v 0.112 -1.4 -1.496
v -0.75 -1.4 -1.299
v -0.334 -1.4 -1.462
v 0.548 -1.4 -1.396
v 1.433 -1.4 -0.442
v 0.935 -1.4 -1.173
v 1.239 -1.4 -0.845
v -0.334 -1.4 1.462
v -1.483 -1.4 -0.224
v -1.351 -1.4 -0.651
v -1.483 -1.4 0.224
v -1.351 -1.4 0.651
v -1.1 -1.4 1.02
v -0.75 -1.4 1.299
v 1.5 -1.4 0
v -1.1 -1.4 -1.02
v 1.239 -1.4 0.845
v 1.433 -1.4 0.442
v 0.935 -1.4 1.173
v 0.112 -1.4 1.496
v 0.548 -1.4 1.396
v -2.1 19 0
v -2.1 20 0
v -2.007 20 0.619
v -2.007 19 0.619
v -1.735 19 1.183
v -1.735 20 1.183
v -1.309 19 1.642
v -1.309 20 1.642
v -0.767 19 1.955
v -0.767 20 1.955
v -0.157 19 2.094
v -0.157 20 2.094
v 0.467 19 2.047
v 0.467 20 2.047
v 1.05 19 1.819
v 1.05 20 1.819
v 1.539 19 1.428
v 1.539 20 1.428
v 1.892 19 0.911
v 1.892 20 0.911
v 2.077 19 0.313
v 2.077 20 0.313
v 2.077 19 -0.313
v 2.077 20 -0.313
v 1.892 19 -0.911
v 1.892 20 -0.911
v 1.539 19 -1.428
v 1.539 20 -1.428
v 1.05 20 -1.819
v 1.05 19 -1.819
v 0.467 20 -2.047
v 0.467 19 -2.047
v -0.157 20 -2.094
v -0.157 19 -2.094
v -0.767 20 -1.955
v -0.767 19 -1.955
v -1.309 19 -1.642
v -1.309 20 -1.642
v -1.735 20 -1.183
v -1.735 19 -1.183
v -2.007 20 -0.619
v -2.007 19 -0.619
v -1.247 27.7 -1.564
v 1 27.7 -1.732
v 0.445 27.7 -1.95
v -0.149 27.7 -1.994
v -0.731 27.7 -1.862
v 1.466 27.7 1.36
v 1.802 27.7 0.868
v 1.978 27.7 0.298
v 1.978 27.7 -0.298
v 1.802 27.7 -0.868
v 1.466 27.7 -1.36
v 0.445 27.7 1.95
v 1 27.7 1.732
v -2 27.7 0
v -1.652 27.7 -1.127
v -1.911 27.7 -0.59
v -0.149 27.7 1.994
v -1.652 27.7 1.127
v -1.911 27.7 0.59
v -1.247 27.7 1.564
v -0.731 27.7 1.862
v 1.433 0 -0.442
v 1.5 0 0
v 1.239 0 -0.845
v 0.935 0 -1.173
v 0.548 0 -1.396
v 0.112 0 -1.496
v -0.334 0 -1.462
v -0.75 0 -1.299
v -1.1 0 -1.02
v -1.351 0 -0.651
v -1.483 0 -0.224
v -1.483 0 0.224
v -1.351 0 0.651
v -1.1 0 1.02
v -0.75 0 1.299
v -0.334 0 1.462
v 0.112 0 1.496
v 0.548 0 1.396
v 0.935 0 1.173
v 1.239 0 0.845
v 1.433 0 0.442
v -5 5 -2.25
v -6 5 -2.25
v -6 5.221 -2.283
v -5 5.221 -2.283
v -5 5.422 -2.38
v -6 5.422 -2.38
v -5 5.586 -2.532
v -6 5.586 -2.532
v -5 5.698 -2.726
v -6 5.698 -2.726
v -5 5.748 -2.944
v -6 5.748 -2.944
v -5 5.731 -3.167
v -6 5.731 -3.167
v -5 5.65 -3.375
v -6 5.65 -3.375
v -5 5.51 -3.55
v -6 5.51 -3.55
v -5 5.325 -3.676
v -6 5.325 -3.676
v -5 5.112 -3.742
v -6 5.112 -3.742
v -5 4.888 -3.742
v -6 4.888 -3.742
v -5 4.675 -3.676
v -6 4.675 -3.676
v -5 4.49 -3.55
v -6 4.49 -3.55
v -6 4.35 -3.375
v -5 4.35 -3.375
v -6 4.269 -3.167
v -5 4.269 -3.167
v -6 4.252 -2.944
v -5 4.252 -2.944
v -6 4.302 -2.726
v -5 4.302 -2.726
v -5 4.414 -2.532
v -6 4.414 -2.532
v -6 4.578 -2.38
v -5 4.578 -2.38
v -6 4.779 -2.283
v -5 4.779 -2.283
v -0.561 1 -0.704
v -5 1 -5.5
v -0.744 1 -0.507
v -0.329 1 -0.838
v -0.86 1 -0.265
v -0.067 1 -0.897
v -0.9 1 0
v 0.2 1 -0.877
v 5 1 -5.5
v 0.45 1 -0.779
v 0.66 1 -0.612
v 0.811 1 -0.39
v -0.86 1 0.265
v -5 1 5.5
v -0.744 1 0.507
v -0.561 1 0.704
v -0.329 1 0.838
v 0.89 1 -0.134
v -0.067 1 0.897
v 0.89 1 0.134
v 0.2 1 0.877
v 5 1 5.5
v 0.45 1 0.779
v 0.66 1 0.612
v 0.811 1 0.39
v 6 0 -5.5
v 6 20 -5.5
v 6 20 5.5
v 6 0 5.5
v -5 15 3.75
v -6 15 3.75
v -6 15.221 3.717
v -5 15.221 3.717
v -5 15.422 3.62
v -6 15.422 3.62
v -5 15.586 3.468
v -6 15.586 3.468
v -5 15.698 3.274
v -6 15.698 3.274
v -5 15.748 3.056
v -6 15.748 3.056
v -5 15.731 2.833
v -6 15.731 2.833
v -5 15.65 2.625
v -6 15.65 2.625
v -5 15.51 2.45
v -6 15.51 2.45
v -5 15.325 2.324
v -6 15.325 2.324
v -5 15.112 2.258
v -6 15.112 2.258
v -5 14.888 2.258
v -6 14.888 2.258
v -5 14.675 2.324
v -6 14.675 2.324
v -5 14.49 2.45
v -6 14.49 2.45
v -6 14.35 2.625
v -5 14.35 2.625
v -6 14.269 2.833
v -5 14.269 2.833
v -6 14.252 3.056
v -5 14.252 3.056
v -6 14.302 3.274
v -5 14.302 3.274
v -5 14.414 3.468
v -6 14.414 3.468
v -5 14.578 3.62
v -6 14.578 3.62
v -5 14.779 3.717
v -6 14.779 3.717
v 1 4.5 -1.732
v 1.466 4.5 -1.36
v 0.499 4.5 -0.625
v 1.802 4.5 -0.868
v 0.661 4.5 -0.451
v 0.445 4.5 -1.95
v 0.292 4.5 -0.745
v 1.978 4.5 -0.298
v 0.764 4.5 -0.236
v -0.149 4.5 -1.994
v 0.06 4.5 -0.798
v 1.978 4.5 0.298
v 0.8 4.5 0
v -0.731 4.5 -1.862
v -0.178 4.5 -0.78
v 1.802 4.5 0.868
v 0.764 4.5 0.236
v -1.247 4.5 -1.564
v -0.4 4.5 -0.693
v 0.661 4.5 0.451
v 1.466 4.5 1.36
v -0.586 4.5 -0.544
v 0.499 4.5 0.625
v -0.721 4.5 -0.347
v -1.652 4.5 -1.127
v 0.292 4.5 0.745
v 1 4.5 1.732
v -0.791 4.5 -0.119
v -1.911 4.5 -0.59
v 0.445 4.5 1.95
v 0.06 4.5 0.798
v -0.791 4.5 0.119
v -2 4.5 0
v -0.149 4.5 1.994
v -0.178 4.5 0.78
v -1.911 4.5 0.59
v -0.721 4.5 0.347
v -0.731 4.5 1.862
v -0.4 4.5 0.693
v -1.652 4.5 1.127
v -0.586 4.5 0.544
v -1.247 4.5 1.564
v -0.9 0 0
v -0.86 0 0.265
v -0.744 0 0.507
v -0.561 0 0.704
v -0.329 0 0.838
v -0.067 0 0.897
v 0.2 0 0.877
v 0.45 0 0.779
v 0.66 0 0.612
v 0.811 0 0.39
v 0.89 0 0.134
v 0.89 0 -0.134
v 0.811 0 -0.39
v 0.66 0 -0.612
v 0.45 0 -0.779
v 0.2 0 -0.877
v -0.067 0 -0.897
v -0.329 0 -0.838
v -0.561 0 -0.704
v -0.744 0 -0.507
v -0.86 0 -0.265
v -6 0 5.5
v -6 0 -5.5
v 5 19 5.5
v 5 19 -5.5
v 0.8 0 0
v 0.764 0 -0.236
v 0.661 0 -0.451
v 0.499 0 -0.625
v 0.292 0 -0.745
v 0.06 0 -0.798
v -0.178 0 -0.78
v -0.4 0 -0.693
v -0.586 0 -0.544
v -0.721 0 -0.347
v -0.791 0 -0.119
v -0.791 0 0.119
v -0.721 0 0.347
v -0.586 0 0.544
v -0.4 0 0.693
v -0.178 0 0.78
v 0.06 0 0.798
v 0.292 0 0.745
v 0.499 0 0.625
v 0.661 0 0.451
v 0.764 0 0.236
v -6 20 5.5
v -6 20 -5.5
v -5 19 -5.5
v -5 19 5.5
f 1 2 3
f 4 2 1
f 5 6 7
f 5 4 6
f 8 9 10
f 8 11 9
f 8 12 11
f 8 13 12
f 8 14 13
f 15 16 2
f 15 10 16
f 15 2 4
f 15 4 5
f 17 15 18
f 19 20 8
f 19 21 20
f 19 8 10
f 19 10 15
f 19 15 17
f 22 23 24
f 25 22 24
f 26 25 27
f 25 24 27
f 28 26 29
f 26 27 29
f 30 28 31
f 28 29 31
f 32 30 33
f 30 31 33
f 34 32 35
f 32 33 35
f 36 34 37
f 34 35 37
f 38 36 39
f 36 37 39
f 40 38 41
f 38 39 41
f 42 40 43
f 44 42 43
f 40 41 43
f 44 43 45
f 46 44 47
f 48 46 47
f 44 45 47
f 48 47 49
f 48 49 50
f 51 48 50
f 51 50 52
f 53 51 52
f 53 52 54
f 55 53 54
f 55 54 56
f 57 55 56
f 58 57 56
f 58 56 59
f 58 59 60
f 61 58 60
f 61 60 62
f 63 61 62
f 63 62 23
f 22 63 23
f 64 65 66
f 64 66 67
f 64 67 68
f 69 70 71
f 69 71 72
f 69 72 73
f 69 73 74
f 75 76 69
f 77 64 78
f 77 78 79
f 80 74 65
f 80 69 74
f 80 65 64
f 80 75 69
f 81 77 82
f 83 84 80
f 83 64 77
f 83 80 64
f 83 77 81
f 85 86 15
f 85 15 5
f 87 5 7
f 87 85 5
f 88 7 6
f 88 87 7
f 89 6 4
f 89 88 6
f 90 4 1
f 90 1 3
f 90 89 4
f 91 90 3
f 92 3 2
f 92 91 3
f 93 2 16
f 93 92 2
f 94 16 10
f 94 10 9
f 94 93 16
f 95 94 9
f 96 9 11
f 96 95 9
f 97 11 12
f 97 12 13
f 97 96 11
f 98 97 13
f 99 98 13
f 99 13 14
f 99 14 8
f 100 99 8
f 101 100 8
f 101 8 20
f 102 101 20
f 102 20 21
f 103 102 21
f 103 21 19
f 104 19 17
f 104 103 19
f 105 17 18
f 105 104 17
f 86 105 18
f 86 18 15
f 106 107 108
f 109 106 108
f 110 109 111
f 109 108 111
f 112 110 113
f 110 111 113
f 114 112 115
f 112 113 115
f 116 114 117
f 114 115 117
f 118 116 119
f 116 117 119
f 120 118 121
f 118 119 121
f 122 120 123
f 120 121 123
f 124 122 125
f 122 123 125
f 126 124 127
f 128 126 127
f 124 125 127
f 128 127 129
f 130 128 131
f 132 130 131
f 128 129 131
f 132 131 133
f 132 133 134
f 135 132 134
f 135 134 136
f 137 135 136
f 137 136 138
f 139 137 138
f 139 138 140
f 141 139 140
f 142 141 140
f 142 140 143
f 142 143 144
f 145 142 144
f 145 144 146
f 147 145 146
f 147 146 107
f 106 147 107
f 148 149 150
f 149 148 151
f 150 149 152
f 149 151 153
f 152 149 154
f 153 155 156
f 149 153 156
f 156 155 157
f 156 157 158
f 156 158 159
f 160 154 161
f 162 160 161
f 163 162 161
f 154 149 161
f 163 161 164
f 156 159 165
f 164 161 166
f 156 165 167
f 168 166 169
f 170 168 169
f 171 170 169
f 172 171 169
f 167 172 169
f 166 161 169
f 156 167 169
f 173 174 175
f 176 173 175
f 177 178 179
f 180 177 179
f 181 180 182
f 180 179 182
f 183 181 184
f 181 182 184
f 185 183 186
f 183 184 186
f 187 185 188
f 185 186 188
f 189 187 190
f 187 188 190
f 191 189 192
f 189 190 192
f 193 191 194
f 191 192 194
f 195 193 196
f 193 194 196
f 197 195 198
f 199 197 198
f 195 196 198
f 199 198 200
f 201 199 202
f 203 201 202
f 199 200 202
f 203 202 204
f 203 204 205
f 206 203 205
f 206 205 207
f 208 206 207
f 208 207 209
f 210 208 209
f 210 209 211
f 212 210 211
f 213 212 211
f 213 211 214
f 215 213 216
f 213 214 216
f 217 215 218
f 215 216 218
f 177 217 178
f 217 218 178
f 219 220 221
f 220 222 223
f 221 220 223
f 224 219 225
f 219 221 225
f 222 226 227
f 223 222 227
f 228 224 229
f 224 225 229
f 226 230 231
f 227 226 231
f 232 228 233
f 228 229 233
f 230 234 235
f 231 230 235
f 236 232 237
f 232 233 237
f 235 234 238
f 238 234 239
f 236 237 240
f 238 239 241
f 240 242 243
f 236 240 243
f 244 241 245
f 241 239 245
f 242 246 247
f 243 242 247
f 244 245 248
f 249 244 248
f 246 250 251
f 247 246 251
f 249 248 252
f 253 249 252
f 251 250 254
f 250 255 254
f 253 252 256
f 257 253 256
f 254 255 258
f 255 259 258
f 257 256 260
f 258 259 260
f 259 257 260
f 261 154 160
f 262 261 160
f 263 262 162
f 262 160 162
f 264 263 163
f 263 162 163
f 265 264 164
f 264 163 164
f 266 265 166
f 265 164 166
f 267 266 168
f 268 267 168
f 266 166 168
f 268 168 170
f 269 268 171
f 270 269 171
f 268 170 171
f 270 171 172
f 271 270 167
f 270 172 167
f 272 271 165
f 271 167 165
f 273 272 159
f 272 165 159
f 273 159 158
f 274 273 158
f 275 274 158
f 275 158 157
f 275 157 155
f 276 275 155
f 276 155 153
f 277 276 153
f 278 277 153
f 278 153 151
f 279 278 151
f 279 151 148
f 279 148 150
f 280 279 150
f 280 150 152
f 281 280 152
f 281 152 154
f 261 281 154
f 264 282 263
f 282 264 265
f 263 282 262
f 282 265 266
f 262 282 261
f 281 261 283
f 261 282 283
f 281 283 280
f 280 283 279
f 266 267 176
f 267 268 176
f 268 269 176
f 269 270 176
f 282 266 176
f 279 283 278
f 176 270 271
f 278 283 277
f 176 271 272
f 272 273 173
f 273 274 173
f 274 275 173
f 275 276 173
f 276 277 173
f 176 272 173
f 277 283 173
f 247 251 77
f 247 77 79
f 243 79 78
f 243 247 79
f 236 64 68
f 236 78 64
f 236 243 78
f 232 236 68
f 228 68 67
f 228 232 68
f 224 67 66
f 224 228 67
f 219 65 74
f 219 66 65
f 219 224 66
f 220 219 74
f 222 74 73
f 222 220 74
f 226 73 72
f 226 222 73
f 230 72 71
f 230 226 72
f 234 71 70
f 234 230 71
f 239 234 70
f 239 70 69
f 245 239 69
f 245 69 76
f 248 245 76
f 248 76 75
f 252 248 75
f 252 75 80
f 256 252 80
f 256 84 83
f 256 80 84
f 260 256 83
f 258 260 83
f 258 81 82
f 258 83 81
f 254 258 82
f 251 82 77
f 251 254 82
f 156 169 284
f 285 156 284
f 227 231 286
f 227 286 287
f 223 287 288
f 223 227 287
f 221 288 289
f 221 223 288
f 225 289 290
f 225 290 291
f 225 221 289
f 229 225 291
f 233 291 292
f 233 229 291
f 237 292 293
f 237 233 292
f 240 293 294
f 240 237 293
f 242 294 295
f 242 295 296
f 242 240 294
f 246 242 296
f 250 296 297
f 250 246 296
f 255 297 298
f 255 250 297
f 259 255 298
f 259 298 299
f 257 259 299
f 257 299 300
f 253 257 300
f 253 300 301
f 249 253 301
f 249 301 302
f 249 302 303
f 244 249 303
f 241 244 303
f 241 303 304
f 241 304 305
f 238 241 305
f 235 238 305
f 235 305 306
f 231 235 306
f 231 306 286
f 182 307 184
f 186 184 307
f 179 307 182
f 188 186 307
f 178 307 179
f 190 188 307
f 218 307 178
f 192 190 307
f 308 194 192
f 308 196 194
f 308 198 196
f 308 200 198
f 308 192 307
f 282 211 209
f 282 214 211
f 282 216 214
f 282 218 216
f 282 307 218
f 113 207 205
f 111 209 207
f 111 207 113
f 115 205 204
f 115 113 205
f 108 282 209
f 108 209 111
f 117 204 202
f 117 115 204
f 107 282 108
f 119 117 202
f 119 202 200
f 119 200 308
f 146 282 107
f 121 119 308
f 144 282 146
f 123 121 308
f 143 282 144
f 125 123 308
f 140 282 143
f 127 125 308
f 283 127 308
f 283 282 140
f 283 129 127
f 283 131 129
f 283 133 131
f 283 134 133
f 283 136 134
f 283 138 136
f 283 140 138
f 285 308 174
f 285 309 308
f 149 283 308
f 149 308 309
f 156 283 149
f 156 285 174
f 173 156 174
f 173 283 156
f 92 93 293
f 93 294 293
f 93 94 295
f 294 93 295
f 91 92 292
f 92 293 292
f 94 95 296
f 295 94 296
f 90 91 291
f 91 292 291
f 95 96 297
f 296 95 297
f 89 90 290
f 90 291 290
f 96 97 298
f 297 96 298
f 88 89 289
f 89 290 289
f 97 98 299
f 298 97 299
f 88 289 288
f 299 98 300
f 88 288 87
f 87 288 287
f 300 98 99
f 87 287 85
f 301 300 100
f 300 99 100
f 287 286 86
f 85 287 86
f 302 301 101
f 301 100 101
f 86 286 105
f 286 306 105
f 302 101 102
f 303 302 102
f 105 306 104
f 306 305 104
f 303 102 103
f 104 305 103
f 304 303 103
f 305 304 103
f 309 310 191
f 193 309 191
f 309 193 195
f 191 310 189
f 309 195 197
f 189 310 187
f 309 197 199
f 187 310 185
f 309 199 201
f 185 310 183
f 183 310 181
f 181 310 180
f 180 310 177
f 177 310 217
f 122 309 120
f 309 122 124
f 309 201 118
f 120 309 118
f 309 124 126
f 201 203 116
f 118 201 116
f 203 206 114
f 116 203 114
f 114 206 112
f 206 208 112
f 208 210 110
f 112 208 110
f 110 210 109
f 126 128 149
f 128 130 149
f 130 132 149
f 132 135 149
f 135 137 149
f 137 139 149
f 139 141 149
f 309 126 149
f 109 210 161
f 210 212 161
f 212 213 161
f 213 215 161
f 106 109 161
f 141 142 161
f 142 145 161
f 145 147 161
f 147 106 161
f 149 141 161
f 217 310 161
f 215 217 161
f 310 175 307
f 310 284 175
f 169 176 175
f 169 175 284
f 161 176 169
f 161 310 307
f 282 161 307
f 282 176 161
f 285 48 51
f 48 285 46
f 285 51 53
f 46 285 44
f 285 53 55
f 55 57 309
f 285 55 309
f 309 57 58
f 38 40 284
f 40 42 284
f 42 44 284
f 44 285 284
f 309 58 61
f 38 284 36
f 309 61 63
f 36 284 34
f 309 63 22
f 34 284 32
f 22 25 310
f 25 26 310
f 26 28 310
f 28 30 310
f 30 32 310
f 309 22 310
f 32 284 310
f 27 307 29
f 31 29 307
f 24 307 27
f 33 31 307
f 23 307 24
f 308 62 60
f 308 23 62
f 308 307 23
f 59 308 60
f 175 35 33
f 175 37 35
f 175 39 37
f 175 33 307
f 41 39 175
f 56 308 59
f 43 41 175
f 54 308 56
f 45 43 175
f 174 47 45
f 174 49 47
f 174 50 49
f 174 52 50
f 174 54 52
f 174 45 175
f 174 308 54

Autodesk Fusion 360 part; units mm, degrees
sketch "スケッチ1" plane through (0, 0, 0) normal (0, 1, 0) x (1, 0, 0)
  line L0 (6, -5.5) -> (-6, -5.5)
  line L1 (-6, -5.5) -> (-6, 5.5)
  line L2 (-6, 5.5) -> (6, 5.5)
  line L3 (6, 5.5) -> (6, -5.5)
  line L4 (6, -5.5) -> (-6, 5.5) construction
  line L5 (-6, -5.5) -> (6, 5.5) construction
  dimension "d1" = 12
  dimension "d2" = 11
extrude "押し出し1" add sketch "スケッチ1" along normal blind 20 makes body 1 in component "Component'"
sketch "スケッチ2" plane through (0, 0, 5.5) normal (0, 0, 1) x (1, 0, 0)
  line L0 (-6, 0) -> (6, 0)
  line L1 (6, 0) -> (6, 20)
  line L2 (6, 20) -> (-6, 20)
  line L3 (-6, 20) -> (-6, 0)
  line L4 (-5, 1) -> (5, 1)
  line L5 (5, 1) -> (5, 19)
  line L6 (5, 19) -> (-5, 19)
  line L7 (-5, 19) -> (-5, 1)
extrude "押し出し2" cut sketch "スケッチ2" against normal blind 24 contours L4 L5 L6 L7 bodies 1 in component "Component'"
sketch "スケッチ3" plane through (0, 20, 0) normal (0, 1, 0) x (-1, 0, 0)
  line L0 (-6, -5.5) -> (6, -5.5)
  line L1 (6, -5.5) -> (6, 5.5)
  line L2 (6, 5.5) -> (-6, 5.5)
  line L3 (-6, 5.5) -> (-6, -5.5)
  circle A0 centre (0, 0) radius 2.1
  dimension "d7" = 4.2
extrude "押し出し3" cut sketch "スケッチ3" against normal blind 6 contours A0 bodies 1 in component "Component'"
sketch "スケッチ4" plane through (0, 1, 0) normal (0, 1, 0) x (-1, 0, 0)
  line L0 (-5, -5.5) -> (5, -5.5)
  line L1 (5, -5.5) -> (5, 5.5)
  line L2 (5, 5.5) -> (-5, 5.5)
  line L3 (-5, 5.5) -> (-5, -5.5)
  circle A0 centre (0, 0) radius 0.9
  dimension "d10" = 1.8
extrude "押し出し4" cut sketch "スケッチ4" against normal blind 1.5 contours A0 bodies 1 in component "Component'"
sketch "スケッチ5" plane through (0, 0, 0) normal (0, 1, 0) x (1, 0, 0)
  circle A0 centre (0, 0) radius 0.8
  dimension "d13" = 1.6
extrude "押し出し1'" add sketch "スケッチ5" against normal blind 3.5 separate body makes body 2 in component "Component''"
sketch "スケッチ6" plane through (0, -3.5, 0) normal (0, -1, 0) x (1, 0, 0)
  circle A0 centre (0, 0) radius 0.8
  circle A1 centre (0, 0) radius 1.5
  dimension "d16" = 3
extrude "押し出し2'" add sketch "スケッチ6" along normal blind 1.4 contours A0 | A1 bodies 2 in component "Component''"
move_face "面をオフセット1" offset 1 1 faces at (0.273, 0, -0.1637) on bodies 2 in component "Component''"
sketch "スケッチ7" plane through (0, 1, 0) normal (0, 1, 0) x (-1, 0, 0)
  circle A0 centre (0, 0) radius 0.8
  circle A1 centre (0, 0) radius 2
  dimension "d20" = 4
extrude "押し出し3'" add sketch "スケッチ7" along normal blind 23.2 contours A0 | A1 bodies 2 in component "Component''"
sketch "スケッチ8" plane through (-6, 0, 0) normal (-1, 0, 0) x (0, 0, 1)
  line L0 (-5.5, 0) -> (5.5, 0)
  line L1 (5.5, 0) -> (5.5, 20)
  line L2 (5.5, 20) -> (-5.5, 20)
  line L3 (-5.5, 20) -> (-5.5, 0)
  line L4 (-5.5, 0) -> (-3, 0) construction
  line L5 (-3, 0) -> (-3, 5) construction
  line L6 (-3, 5) -> (-5.5, 5) construction
  line L7 (-5.5, 5) -> (-5.5, 0) construction
  circle A0 centre (-3, 5) radius 0.75
  dimension "d23" = 2.5
  dimension "d24" = 5
  dimension "d25" = 1.5
extrude "押し出し5" cut sketch "スケッチ8" against normal blind 2 contours A0 bodies 1 in component "Component'"
sketch "スケッチ9" plane through (-6, 0, 0) normal (-1, 0, 0) x (0, 0, 1)
  circle A0 centre (-3, 5) radius 0.75
  line L0 (-5.5, 0) -> (5.5, 0)
  line L1 (5.5, 0) -> (5.5, 20)
  line L2 (5.5, 20) -> (-5.5, 20)
  line L3 (-5.5, 20) -> (-5.5, 0)
  line L4 (5.5, 0) -> (3, 0) construction
  line L5 (3, 0) -> (3, 15) construction
  line L6 (3, 15) -> (5.5, 15) construction
  line L7 (5.5, 15) -> (5.5, 0) construction
  circle A1 centre (3, 15) radius 0.75
  dimension "d28" = 15
  dimension "d29" = 2.5
  dimension "d30" = 1.5
extrude "押し出し6" cut sketch "スケッチ9" against normal blind 2 contours A1 bodies 1 in component "Component'"
component "Component'" placed x (1, 0, 0) y (0, 1, 0) z (0, 0, 1) at (0, 0, 0)
component "Component''" placed x (1, 0, 0) y (0, 1, 0) z (0, 0, 1) at (0, 3.5, 0)
